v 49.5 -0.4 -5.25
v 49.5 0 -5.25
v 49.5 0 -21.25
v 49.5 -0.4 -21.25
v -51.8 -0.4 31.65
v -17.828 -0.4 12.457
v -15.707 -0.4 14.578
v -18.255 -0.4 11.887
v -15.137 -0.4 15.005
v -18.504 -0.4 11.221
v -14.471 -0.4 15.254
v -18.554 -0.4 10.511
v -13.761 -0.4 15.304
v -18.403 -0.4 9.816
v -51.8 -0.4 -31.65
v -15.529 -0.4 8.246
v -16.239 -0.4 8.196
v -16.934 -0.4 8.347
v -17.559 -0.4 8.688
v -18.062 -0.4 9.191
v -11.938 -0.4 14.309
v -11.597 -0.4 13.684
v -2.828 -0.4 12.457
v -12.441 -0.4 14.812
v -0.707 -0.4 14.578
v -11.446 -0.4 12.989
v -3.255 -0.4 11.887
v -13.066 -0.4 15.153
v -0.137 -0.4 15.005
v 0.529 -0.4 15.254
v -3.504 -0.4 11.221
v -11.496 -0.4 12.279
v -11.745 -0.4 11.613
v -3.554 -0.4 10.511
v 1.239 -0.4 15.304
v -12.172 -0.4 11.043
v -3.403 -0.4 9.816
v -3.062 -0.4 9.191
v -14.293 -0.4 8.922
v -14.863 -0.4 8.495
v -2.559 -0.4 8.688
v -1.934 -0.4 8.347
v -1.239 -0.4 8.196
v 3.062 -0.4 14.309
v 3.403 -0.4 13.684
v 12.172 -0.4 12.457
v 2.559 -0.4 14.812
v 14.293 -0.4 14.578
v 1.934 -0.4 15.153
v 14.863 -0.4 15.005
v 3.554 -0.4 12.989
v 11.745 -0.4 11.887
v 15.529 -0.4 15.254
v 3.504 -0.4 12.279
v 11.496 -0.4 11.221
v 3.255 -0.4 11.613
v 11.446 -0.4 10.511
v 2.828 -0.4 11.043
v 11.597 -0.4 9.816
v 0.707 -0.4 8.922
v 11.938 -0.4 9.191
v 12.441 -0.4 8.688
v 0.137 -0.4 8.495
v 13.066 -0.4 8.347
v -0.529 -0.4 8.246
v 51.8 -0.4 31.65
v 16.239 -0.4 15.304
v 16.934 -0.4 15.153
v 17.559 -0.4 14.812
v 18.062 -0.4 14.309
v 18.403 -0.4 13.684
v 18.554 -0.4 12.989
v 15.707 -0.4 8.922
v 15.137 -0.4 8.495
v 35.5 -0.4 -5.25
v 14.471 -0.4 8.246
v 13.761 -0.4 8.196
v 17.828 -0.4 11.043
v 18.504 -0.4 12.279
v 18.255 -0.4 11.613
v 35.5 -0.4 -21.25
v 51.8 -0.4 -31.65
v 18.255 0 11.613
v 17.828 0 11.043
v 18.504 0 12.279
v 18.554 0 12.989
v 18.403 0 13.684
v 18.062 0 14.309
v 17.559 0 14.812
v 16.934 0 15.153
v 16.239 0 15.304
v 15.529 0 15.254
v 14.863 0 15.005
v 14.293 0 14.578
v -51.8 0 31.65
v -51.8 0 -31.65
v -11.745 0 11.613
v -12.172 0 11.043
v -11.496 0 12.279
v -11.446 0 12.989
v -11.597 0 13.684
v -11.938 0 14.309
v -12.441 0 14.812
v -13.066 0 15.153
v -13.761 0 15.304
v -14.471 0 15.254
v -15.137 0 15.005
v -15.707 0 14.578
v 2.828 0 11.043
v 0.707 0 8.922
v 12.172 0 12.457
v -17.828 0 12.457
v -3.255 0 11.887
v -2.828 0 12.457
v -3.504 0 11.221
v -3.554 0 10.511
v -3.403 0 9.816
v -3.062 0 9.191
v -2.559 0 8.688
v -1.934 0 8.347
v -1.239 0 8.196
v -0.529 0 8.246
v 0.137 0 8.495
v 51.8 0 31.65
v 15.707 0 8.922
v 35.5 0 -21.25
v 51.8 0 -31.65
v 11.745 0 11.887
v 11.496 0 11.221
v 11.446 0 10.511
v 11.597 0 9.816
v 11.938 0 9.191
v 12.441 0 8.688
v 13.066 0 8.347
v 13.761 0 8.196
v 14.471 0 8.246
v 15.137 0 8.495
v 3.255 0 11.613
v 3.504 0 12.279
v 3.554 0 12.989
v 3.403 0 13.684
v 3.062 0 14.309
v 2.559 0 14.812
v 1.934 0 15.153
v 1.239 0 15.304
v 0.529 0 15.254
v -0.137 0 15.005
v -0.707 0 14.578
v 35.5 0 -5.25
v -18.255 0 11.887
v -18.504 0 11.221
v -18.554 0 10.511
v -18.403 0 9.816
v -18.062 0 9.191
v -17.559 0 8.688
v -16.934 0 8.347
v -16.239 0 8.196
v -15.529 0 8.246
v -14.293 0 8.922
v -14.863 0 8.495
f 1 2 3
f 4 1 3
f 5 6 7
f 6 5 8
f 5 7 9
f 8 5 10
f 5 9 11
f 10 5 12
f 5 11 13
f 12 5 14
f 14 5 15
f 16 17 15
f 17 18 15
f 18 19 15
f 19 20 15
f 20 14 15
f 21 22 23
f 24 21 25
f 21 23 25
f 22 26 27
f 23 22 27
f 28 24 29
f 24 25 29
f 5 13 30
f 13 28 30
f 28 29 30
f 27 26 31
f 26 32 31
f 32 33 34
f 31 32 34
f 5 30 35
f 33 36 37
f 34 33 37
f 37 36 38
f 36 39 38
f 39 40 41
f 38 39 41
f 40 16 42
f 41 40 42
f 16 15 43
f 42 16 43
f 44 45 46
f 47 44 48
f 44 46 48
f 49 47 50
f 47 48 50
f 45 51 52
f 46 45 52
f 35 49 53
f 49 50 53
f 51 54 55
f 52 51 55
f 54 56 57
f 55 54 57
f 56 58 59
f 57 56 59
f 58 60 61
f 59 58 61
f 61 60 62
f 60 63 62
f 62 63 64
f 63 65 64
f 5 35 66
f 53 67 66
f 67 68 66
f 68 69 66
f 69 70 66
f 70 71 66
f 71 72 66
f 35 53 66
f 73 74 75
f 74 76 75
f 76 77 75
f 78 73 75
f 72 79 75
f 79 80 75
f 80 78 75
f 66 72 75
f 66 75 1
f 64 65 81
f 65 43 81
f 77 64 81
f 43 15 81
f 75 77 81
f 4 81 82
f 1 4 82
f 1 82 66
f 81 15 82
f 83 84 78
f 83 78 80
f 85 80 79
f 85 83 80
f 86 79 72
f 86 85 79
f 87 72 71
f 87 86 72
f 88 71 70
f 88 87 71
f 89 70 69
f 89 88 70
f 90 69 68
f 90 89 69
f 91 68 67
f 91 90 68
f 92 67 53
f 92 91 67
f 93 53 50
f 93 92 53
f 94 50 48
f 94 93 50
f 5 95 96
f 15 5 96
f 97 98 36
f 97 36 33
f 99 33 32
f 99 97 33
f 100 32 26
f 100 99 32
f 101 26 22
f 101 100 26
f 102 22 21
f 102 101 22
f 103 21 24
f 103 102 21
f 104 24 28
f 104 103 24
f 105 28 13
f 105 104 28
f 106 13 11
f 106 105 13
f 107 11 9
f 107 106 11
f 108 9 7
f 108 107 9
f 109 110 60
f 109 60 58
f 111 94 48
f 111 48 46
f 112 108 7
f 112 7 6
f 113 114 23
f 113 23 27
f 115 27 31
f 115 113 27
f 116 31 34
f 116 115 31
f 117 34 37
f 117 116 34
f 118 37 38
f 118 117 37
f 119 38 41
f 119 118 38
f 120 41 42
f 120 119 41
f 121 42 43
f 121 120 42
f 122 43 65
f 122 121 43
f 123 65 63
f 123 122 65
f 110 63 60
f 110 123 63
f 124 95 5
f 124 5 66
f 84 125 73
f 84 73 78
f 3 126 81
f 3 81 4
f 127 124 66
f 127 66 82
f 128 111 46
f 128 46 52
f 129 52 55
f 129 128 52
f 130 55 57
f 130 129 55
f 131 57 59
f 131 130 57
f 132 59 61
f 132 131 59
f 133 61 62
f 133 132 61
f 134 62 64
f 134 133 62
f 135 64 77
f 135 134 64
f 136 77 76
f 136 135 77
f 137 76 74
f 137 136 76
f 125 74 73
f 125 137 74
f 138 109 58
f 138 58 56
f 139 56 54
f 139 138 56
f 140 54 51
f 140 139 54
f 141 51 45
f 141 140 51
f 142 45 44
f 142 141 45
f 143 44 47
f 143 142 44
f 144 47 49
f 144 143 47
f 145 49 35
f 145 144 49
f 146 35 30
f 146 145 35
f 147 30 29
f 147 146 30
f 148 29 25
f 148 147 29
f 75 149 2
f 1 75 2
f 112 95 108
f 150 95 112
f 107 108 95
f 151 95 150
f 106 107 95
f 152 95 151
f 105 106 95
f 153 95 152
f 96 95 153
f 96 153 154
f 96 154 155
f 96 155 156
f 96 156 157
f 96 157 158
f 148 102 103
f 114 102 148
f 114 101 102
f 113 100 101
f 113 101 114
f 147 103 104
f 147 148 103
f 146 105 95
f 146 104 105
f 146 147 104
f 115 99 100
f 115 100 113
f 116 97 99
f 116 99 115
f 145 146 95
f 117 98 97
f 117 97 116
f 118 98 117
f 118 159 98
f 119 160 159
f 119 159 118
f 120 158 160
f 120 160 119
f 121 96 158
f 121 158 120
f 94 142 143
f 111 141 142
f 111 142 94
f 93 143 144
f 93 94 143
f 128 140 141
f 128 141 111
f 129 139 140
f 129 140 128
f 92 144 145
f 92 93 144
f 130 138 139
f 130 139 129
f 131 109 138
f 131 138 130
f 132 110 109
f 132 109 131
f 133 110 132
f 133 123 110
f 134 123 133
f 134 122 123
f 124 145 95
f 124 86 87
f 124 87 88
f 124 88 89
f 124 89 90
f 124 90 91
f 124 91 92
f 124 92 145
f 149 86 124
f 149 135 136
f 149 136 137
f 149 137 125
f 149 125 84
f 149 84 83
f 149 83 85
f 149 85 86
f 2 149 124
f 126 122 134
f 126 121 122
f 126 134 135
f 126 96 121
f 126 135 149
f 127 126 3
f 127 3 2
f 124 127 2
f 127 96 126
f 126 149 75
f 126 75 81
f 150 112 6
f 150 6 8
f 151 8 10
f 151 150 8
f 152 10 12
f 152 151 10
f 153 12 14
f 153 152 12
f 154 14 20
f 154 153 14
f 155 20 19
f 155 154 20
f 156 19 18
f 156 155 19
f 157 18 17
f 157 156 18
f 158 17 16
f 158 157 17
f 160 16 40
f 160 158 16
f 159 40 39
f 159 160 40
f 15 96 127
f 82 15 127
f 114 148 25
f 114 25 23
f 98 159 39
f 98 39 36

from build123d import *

# Parameters (mm, degrees)
SKETCH1_W           = 103.6
SKETCH1_H           = 63.3
BOSS_EXTRUDE1_DEPTH = 0.4
SKETCH2_W           = 14
SKETCH2_H           = 16
CUT_EXTRUDE1_DEPTH  = 61.705209826
CUT_EXTRUDE2_DEPTH  = 61.705209826
LPATTERN1_COUNT     = 2
LPATTERN1_PITCH     = 15
LPATTERN1_COL_COUNT = 2
LPATTERN1_COL_PITCH = 15


with BuildPart() as part:
    # Sketch1 → Boss-Extrude1 (new body)
    with BuildSketch(Plane(origin=(0, 0, 0), x_dir=(1, 0, 0), z_dir=(0, 1, 0))):
        Rectangle(SKETCH1_W, SKETCH1_H)
    extrude(amount=-BOSS_EXTRUDE1_DEPTH)

    # Sketch2 → Cut-Extrude1 (cut, through all)
    with BuildSketch(Plane(origin=(0, 0, 0), x_dir=(1, 0, 0), z_dir=(0, 1, 0))):
        with Locations((42.5, 13.25)):
            Rectangle(SKETCH2_W, SKETCH2_H)
    extrude(amount=-CUT_EXTRUDE1_DEPTH, mode=Mode.SUBTRACT)

    # Sketch3 → Cut-Extrude2 (cut, through all)
    with BuildSketch(Plane(origin=(0, 0, 0), x_dir=(1, 0, 0), z_dir=(0, 1, 0))):
        with BuildLine():
            Line((0.707106781, -8.921572875), (2.828427125, -11.042893219))
            ThreePointArc((2.828427125, -11.042893219), (2.828427125, -14.578427125), (-0.707106781, -14.578427125))
            Line((-0.707106781, -14.578427125), (-2.828427125, -12.457106781))
            ThreePointArc((-2.828427125, -12.457106781), (-2.828427125, -8.921572875), (0.707106781, -8.921572875))
        make_face()
    cut_extrude2 = extrude(amount=-CUT_EXTRUDE2_DEPTH, mode=Mode.SUBTRACT)

    # LPattern1: Cut-Extrude2 ×2
    with Locations(*[(i * LPATTERN1_PITCH, 0, 0) for i in range(1, LPATTERN1_COUNT)]):
        add(cut_extrude2, mode=Mode.SUBTRACT)

    # LPattern1 col: Cut-Extrude2 ×2
    with Locations(*[(-i * LPATTERN1_COL_PITCH, 0, 0) for i in range(1, LPATTERN1_COL_COUNT)]):
        add(cut_extrude2, mode=Mode.SUBTRACT)


solid = part.part
